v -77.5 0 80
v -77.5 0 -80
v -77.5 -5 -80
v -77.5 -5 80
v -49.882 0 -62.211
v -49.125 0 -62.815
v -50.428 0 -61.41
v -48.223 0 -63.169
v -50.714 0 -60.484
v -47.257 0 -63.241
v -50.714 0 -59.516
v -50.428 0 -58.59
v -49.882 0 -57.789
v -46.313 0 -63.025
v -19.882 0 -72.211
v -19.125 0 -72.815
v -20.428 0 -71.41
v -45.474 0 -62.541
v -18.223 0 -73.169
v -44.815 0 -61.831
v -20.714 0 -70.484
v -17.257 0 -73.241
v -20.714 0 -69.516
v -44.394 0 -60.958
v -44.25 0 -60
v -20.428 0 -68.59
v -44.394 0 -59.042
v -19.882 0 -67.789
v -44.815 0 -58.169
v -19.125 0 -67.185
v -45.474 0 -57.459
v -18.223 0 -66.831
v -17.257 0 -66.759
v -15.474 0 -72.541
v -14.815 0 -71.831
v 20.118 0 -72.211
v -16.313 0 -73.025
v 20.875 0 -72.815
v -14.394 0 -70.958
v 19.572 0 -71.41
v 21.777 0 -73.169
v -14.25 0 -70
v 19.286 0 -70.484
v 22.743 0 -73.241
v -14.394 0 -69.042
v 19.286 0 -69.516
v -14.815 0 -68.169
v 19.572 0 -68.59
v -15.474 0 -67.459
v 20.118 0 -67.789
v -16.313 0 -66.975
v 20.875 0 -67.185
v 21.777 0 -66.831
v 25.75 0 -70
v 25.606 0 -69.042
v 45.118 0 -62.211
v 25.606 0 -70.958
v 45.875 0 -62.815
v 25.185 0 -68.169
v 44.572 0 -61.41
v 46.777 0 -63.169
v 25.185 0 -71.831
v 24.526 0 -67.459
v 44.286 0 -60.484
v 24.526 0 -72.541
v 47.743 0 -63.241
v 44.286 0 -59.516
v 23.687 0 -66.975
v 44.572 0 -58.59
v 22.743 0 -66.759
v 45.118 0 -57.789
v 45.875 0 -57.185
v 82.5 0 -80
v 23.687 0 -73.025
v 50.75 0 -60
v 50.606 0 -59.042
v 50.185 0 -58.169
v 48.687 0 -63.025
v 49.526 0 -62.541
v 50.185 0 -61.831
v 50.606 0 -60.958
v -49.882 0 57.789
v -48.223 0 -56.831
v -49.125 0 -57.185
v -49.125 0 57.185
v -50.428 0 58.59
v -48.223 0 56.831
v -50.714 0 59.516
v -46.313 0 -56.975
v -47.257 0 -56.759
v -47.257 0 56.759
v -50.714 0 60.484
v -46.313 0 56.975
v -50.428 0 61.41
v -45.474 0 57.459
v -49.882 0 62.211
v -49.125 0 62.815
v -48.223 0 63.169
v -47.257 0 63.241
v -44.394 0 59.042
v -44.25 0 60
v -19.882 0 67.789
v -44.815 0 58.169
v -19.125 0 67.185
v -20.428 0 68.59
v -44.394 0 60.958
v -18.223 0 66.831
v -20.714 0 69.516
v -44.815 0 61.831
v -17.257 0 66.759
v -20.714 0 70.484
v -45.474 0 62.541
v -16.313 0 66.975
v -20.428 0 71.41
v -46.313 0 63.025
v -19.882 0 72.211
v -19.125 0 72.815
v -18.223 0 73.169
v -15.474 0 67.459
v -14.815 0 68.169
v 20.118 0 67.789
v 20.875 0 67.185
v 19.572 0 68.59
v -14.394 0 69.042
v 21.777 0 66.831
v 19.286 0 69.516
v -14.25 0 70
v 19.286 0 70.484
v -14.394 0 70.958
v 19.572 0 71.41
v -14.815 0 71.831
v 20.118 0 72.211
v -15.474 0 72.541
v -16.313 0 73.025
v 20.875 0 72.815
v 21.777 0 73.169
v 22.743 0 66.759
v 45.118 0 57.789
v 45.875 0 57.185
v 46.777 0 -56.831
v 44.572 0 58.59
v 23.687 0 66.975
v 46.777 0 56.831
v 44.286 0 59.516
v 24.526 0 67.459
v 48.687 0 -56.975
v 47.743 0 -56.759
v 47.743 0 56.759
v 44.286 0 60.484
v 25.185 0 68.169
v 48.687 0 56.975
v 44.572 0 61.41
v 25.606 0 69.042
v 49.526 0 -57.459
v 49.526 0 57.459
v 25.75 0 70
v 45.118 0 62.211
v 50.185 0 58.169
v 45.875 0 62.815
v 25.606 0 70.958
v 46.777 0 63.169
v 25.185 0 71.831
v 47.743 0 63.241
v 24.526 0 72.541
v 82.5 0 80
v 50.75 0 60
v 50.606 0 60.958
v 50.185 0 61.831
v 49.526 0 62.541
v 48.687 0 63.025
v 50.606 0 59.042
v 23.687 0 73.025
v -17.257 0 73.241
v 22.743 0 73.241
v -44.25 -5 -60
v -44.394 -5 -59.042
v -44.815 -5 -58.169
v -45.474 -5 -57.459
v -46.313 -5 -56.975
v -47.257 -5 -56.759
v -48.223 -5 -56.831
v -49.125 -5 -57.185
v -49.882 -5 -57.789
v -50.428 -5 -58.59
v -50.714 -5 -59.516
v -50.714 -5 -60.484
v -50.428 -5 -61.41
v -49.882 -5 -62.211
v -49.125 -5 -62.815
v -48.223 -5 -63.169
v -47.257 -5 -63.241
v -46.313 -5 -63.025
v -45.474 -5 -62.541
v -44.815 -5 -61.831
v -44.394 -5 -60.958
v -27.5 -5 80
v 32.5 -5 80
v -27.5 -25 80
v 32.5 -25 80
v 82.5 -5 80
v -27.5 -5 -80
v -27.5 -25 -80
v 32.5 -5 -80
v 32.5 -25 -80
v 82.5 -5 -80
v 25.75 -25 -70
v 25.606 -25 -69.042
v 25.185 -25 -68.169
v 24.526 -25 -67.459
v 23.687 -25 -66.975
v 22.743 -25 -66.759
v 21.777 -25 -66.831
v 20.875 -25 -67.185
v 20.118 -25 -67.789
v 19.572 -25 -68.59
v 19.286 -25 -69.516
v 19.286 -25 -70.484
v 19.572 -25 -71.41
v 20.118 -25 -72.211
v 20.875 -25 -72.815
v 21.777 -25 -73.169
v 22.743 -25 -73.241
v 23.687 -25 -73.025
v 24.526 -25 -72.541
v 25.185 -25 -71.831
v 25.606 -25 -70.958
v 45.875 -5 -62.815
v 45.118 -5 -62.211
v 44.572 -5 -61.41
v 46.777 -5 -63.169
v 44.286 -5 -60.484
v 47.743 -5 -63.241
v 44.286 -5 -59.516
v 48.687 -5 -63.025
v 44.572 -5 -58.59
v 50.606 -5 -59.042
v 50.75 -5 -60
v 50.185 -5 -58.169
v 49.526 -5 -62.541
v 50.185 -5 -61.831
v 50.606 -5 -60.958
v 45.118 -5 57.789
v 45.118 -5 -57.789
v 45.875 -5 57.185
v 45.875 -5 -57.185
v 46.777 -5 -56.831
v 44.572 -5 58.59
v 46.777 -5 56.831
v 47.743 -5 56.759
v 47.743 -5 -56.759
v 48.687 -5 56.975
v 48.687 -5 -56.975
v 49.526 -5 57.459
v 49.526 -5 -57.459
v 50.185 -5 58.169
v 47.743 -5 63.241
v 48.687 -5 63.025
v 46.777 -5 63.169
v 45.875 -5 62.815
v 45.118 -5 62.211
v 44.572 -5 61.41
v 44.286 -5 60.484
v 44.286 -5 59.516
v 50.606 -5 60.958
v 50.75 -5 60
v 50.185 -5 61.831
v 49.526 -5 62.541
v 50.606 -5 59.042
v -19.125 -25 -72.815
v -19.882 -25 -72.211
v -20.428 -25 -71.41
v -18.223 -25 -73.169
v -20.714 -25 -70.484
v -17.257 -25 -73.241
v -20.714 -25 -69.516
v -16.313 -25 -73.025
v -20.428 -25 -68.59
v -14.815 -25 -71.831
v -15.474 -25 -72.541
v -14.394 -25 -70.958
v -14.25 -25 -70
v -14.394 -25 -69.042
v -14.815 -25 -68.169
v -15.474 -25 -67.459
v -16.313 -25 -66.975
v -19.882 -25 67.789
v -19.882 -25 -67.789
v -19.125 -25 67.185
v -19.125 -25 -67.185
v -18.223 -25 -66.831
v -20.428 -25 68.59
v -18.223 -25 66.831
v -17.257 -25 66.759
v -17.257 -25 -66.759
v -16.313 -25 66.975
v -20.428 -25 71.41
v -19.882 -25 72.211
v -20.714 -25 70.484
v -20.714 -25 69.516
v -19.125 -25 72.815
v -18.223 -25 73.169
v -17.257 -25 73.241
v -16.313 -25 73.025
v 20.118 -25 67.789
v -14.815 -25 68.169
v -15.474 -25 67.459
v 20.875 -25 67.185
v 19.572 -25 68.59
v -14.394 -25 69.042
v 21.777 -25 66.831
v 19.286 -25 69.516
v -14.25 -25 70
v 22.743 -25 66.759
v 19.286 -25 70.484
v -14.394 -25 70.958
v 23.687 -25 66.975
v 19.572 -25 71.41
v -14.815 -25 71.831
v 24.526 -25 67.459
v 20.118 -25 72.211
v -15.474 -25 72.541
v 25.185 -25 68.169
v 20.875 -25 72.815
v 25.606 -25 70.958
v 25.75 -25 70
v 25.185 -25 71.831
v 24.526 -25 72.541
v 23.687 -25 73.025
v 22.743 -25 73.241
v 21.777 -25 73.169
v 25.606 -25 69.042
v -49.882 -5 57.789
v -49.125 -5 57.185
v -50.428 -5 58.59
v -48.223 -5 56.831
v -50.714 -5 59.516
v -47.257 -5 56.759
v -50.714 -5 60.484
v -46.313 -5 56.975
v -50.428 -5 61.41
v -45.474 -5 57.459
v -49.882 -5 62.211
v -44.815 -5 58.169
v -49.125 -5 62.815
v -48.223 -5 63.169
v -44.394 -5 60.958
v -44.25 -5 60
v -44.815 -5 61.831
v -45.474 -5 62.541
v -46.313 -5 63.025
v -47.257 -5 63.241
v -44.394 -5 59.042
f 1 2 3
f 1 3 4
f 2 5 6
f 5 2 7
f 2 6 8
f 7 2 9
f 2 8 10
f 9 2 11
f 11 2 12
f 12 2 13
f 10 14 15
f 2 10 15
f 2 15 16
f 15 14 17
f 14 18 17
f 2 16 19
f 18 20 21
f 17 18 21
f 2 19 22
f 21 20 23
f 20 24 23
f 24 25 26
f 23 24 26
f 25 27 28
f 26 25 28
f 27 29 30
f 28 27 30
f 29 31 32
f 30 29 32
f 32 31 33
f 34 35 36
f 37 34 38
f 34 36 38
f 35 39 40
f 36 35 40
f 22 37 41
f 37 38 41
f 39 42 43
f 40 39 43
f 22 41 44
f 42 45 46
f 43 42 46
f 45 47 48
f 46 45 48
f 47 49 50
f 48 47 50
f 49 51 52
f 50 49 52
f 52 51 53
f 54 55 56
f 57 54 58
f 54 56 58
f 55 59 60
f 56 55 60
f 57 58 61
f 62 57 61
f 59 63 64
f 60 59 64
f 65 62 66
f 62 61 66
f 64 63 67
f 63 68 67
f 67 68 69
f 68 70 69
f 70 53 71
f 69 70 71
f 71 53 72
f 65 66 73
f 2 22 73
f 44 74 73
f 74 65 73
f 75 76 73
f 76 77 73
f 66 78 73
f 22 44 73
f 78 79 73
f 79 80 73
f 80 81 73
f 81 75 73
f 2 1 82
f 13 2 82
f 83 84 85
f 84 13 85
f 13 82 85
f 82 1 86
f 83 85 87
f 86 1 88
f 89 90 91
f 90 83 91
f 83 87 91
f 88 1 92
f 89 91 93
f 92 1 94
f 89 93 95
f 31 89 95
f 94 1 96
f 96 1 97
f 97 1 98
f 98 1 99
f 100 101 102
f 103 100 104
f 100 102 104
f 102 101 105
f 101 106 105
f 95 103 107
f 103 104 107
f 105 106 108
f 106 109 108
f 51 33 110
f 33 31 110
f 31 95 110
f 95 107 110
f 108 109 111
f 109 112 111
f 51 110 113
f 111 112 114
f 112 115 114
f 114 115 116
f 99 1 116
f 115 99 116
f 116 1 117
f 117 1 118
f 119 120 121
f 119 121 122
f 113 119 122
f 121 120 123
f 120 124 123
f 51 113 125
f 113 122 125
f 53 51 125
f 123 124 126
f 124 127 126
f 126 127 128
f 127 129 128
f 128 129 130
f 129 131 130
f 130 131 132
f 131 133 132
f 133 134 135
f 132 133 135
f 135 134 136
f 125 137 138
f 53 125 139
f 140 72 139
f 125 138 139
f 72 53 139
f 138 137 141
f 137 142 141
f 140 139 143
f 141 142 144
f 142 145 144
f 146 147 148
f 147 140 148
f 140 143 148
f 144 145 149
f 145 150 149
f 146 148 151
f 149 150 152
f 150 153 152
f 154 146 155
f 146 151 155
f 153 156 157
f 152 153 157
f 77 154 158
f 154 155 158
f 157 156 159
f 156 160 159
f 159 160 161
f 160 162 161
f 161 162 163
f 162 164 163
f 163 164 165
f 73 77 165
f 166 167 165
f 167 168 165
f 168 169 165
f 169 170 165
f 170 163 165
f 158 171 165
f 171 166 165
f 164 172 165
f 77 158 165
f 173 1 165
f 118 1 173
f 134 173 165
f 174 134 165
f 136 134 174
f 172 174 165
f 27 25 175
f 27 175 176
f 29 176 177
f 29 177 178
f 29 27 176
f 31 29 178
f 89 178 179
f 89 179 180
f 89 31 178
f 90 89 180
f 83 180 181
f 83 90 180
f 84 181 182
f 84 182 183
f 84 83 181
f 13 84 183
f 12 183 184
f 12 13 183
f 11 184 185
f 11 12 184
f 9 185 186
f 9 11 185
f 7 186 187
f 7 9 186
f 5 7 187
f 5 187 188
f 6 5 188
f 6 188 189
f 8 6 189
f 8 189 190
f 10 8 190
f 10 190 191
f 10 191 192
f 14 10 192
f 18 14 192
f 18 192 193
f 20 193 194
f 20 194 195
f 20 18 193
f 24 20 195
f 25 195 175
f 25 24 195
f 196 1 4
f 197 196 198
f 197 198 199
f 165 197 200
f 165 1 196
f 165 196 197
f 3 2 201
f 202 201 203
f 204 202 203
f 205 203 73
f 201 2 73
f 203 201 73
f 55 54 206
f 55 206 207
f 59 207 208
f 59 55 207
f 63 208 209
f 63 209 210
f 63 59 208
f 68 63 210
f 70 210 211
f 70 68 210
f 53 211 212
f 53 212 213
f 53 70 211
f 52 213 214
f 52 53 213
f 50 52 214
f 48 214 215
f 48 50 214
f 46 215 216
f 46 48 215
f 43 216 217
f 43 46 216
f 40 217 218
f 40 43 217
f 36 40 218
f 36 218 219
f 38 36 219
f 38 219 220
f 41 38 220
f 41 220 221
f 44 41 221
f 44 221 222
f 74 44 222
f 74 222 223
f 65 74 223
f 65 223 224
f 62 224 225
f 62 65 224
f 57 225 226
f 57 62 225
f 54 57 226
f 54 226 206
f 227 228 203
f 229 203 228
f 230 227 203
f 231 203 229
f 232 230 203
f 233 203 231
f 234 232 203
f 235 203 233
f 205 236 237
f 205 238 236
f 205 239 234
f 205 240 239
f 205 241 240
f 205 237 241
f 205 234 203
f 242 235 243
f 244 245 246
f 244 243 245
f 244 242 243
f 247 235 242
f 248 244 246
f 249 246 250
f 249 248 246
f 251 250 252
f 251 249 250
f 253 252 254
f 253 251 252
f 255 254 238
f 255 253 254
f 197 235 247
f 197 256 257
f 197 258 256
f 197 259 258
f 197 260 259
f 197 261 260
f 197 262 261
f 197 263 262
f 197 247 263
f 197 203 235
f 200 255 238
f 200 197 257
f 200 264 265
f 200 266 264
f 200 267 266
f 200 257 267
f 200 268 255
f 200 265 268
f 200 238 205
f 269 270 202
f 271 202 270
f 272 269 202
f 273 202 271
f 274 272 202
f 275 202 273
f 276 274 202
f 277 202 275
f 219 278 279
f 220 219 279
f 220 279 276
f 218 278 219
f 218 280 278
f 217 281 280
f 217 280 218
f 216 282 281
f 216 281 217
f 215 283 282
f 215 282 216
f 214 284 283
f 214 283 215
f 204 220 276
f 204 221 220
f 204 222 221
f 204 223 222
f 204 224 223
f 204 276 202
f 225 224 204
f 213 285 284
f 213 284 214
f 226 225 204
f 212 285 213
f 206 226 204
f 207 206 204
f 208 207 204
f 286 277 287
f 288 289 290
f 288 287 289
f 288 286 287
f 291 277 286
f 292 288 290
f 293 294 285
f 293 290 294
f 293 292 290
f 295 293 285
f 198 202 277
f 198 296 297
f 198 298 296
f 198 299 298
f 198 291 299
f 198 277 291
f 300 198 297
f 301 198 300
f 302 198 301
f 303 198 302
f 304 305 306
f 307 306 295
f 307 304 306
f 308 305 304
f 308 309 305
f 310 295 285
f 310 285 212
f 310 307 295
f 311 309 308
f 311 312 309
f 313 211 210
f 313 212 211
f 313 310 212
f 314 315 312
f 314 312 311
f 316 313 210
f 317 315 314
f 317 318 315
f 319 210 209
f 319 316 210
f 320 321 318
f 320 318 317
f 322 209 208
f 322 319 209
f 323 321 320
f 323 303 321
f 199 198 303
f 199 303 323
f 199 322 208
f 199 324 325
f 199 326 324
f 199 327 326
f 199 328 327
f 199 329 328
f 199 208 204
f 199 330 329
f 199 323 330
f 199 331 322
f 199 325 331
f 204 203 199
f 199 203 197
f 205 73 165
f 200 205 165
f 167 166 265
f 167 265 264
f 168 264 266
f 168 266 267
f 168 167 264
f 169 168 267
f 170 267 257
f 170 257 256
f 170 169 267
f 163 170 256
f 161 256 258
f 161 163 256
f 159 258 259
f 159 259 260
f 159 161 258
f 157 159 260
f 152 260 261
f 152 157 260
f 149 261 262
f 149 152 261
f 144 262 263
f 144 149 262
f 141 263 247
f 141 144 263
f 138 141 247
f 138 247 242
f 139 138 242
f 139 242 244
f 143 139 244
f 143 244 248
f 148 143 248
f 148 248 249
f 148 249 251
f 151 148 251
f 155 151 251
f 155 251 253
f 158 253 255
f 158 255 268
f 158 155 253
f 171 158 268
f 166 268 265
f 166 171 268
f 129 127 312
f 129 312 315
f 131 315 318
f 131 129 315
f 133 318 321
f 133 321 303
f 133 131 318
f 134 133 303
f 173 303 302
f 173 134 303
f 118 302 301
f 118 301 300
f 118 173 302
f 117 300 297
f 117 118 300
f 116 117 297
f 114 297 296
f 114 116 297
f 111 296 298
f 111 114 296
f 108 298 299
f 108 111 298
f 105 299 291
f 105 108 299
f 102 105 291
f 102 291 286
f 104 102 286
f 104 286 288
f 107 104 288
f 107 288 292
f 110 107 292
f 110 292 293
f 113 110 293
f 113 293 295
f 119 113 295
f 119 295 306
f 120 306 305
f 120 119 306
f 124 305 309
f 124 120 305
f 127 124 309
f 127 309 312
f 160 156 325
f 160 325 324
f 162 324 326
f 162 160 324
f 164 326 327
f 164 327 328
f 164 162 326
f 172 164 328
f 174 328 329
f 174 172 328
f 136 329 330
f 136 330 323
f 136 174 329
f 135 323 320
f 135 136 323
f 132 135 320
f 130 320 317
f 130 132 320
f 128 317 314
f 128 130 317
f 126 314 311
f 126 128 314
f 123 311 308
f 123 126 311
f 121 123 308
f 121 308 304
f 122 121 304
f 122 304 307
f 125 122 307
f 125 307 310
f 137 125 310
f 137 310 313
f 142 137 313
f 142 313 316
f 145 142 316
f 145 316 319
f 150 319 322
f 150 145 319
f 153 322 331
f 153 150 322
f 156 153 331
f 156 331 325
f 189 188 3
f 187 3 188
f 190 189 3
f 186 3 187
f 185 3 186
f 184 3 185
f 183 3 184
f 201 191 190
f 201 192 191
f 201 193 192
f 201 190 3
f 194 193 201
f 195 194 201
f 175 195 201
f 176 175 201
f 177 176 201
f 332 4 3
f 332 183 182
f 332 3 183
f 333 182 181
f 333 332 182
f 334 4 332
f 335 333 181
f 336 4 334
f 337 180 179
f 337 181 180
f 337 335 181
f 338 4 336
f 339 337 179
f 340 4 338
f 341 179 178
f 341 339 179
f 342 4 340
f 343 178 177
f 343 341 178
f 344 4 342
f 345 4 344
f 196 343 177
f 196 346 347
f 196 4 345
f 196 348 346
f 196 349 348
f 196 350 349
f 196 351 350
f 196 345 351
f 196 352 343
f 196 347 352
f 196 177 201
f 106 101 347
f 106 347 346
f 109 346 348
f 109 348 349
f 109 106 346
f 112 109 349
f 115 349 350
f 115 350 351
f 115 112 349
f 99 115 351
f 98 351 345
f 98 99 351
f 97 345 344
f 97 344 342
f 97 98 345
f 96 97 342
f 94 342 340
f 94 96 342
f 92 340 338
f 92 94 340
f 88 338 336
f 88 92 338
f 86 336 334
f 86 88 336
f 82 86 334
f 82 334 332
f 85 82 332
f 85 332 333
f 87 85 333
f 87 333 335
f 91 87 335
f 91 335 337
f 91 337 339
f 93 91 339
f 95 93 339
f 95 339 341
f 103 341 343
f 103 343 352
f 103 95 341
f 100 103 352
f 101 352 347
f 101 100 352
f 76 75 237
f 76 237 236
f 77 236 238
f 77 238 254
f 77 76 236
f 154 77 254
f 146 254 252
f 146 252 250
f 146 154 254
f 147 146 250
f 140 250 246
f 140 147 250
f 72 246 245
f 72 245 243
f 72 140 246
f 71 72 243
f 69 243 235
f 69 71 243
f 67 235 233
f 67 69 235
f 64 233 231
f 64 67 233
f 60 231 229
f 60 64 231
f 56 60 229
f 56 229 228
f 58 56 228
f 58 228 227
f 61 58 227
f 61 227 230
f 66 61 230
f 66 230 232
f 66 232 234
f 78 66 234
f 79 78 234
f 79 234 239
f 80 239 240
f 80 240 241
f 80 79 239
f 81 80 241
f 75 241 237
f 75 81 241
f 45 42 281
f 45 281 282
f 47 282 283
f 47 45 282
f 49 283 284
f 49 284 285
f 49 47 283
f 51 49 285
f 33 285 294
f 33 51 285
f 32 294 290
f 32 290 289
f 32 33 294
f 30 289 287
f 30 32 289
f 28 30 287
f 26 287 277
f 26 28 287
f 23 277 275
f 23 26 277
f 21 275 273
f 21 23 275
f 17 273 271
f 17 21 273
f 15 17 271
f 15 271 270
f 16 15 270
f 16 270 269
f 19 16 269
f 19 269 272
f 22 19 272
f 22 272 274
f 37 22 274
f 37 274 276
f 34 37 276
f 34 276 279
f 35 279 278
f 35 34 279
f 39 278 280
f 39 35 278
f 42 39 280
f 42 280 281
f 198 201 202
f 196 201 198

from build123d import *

# Parameters (mm, degrees)
F0_W     = 50
F0_H     = 160
F0_R     = 3.25
F1_DEPTH = 5
F0_W_2   = 60
F2_DEPTH = 25


# Not quite as in the source:
# - a feature names something its author has since deleted; it is built from what else it names


with BuildPart() as f1:
    # F0 (on Front) → F1 (new body)
    with BuildSketch(Plane.XZ):
        with Locations((-52.5, 0)):
            Rectangle(F0_W, F0_H)
        with Locations((-47.5, -60)):
            Circle(F0_R, mode=Mode.SUBTRACT)
        with Locations((-47.5, 60)):
            Circle(F0_R, mode=Mode.SUBTRACT)
    extrude(amount=F1_DEPTH)



with BuildPart() as f1b:
    # F0 (on Front) → F1, piece 2 (new body)
    with BuildSketch(Plane.XZ):
        with Locations((57.5, 0)):
            Rectangle(F0_W, F0_H)
        with Locations((47.5, -60)):
            Circle(F0_R, mode=Mode.SUBTRACT)
        with Locations((47.5, 60)):
            Circle(F0_R, mode=Mode.SUBTRACT)
    extrude(amount=F1_DEPTH)


with BuildPart() as f1_1:
    add(f1.part)

    add(f1b.part)  # F2 merges F1b
    # F0 (on Front) → F2 (join)
    with BuildSketch(Plane.XZ):
        with Locations((2.5, 0)):
            Rectangle(F0_W_2, F0_H)
        with Locations((-17.5, -70)):
            Circle(F0_R, mode=Mode.SUBTRACT)
        with Locations((22.5, -70)):
            Circle(F0_R, mode=Mode.SUBTRACT)
        with Locations((-17.5, 70)):
            Circle(F0_R, mode=Mode.SUBTRACT)
        with Locations((22.5, 70)):
            Circle(F0_R, mode=Mode.SUBTRACT)
    extrude(amount=F2_DEPTH)


solid = f1_1.part
